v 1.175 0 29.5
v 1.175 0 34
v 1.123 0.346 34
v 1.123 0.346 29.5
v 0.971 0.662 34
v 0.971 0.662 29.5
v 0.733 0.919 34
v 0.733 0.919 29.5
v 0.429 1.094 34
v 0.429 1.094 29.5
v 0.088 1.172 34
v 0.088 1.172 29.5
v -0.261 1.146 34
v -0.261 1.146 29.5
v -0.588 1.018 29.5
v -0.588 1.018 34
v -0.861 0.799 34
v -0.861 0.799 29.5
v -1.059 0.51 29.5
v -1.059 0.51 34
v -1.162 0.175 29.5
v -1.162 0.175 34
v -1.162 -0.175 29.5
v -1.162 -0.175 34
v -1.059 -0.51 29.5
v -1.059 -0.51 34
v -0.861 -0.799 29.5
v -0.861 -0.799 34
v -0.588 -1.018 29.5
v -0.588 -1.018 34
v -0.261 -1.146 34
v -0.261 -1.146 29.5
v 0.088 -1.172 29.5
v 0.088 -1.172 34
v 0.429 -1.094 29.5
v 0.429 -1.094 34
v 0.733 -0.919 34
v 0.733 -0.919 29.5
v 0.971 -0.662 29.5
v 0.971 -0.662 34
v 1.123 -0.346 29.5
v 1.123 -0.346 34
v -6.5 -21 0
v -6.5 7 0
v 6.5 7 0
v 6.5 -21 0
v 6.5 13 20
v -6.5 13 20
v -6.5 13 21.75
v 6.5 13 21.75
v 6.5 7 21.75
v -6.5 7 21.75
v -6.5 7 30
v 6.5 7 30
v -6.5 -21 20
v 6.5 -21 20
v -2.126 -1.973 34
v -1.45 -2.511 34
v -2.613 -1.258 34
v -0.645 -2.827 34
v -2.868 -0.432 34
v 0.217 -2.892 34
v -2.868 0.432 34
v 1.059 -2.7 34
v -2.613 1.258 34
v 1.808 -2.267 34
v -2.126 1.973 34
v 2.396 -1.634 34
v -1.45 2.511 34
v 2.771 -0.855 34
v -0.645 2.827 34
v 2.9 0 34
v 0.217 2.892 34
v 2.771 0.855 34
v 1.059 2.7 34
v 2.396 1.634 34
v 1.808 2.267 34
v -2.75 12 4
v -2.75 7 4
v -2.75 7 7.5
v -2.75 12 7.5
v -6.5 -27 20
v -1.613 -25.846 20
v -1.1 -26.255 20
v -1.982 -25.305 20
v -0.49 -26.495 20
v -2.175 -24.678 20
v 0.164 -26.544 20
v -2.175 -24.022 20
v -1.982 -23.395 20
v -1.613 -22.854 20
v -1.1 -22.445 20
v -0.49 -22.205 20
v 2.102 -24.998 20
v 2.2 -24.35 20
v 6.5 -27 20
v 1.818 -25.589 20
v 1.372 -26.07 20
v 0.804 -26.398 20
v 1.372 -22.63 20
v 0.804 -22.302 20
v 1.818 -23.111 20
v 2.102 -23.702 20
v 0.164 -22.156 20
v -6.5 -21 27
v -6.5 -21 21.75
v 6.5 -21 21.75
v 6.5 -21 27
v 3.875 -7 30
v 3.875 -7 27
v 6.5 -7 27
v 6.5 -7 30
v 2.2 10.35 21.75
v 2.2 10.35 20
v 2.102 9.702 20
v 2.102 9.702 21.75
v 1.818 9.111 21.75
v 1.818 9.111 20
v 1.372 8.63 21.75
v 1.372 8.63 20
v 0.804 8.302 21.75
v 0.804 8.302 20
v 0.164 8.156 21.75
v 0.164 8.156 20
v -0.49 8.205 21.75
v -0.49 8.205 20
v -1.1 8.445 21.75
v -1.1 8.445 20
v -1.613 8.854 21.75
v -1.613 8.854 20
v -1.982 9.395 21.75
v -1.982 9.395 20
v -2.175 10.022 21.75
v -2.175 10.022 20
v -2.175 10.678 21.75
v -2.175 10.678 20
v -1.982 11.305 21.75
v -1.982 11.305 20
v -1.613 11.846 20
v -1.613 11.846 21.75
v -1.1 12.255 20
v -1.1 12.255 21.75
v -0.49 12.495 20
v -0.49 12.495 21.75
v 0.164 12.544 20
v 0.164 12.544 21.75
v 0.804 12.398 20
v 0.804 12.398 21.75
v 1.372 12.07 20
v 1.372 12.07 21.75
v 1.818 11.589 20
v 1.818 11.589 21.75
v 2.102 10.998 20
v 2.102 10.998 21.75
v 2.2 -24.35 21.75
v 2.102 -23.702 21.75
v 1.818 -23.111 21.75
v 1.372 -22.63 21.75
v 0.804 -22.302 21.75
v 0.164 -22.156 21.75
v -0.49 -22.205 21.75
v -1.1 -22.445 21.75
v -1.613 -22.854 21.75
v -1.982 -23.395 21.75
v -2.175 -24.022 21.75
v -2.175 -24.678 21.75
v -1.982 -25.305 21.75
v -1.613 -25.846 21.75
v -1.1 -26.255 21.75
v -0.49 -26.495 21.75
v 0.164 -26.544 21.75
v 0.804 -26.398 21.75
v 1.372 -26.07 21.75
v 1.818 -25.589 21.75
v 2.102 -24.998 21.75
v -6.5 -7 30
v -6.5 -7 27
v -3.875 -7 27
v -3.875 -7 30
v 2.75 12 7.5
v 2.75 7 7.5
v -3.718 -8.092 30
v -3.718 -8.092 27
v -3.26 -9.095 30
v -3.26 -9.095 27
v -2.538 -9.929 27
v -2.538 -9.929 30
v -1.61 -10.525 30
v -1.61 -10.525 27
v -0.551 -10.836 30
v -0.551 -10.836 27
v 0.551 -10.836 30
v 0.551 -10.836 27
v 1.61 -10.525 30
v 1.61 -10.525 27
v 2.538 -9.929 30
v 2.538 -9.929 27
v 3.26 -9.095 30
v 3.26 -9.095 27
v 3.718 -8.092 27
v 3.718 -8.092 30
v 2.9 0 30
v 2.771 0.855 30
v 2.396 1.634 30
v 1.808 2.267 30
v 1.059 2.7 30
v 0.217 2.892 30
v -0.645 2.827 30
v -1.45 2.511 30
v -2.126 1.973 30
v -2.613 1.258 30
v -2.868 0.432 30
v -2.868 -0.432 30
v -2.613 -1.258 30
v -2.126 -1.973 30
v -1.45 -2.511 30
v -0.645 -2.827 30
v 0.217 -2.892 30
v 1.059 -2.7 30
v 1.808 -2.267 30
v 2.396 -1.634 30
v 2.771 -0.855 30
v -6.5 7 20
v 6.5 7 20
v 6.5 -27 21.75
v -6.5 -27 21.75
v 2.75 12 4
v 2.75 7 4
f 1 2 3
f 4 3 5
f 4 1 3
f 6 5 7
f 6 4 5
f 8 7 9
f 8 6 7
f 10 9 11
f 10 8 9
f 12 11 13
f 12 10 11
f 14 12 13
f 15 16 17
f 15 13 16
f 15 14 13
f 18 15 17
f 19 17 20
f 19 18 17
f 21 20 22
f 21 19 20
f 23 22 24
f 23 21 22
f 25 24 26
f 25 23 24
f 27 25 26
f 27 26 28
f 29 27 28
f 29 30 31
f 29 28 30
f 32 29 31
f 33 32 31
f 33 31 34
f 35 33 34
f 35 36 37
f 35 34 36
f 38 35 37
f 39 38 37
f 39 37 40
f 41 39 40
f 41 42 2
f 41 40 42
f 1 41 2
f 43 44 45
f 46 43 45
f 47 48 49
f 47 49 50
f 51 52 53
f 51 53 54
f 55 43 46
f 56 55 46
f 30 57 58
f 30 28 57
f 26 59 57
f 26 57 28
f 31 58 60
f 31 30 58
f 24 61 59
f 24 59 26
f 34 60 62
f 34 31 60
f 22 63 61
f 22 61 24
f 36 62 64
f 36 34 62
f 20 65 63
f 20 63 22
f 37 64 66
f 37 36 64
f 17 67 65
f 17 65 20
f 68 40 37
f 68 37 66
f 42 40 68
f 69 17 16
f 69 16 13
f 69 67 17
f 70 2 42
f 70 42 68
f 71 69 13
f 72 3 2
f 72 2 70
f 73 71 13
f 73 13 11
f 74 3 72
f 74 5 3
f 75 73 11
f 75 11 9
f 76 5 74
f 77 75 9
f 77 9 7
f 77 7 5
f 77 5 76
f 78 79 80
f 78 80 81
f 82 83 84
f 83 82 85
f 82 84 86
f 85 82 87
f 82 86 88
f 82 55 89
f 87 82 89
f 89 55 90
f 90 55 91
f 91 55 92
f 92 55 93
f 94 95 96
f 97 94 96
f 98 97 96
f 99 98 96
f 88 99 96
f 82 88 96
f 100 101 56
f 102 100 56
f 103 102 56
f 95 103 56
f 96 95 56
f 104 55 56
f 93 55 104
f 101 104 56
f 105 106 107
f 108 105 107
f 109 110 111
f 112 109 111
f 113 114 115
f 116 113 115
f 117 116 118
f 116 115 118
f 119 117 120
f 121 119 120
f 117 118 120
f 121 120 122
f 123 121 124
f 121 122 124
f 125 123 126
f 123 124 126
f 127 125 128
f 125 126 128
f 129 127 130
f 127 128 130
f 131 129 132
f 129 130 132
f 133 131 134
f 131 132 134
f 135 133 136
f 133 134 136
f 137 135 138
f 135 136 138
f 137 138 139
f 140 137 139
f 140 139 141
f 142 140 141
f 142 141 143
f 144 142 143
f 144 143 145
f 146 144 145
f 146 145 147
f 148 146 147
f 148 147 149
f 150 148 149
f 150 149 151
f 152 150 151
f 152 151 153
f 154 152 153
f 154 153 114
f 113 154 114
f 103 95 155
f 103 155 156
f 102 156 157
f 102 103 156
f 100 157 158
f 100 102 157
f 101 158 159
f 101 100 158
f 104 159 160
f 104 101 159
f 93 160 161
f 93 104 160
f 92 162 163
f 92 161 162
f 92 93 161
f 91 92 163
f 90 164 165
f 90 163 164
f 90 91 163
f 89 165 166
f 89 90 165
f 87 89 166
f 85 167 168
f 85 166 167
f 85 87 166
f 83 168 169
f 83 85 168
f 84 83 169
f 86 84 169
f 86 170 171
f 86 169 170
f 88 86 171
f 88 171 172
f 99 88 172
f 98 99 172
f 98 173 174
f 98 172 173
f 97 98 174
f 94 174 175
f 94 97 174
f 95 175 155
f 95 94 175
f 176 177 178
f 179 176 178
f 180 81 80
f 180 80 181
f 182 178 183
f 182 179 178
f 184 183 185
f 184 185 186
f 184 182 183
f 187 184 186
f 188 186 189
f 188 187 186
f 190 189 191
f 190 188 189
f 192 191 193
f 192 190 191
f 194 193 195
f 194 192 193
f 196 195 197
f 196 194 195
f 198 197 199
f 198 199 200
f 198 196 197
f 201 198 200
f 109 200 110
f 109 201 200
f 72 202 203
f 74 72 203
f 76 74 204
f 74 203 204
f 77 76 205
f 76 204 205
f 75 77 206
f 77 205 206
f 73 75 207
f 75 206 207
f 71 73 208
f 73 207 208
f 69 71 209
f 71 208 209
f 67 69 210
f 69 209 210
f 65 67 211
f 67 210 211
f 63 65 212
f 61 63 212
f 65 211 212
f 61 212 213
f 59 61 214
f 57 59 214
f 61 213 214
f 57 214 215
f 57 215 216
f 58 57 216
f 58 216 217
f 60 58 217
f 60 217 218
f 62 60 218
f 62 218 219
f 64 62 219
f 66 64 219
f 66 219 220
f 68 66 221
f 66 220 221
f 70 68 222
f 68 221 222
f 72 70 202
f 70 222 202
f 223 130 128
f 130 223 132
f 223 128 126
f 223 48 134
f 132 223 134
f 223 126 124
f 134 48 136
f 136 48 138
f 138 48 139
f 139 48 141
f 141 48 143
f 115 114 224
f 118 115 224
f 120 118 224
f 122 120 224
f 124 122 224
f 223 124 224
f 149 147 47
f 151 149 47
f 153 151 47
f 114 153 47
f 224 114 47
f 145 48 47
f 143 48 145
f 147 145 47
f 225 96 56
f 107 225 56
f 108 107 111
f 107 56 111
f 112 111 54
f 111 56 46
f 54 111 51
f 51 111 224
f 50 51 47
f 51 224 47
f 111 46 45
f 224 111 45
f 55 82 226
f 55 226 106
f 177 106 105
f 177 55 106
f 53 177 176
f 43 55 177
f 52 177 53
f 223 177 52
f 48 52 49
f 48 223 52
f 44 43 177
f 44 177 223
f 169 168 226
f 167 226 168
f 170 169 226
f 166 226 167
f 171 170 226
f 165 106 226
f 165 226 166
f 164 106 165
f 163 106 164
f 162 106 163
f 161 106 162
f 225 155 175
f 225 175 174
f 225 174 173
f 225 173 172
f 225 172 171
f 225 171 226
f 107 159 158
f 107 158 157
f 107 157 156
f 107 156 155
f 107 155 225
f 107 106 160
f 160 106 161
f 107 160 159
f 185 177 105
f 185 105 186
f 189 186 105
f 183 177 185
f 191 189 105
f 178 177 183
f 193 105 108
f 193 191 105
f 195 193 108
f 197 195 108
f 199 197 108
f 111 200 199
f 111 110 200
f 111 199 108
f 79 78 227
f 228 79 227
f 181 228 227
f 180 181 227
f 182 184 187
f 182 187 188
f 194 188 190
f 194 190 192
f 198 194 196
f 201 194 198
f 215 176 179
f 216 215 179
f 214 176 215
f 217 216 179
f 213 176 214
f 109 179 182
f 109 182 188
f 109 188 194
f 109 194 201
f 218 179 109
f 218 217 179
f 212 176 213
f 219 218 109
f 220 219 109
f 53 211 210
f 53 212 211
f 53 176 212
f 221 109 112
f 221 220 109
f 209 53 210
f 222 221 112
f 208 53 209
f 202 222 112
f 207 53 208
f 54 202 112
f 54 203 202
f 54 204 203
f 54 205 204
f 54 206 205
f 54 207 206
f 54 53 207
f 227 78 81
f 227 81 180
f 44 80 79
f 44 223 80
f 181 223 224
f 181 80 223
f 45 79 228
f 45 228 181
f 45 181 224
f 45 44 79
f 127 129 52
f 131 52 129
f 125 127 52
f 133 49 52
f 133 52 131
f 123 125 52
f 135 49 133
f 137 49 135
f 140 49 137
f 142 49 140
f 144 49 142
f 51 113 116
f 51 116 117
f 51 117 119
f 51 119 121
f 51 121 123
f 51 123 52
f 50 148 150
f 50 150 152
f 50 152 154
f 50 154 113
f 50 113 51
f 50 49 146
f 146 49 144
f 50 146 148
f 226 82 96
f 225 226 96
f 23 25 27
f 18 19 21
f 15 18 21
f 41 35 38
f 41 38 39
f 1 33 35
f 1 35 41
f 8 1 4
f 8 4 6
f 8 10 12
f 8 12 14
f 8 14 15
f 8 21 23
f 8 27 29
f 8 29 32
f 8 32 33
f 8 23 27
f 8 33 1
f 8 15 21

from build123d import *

# Parameters (mm, degrees)
CYLINDER001_R     = 2.2
CYLINDER001_DEPTH = 5
CYLINDER002_R     = 1.175
CYLINDER002_DEPTH = 5
BOX004_W          = 5.5
BOX004_H          = 5
BOX004_DEPTH      = 3.5
CYLINDER_R        = 2.9
CYLINDER_DEPTH    = 4
BOX003_W          = 13
BOX003_H          = 14
BOX003_DEPTH      = 7
BOX002_W          = 13
BOX002_H          = 14
BOX002_DEPTH      = 10
BOX001_W          = 13
BOX001_H          = 40
BOX001_DEPTH      = 1.75
BOX_W             = 13
BOX_H             = 28
BOX_DEPTH         = 20
CYLINDER003_W     = 3.875
CYLINDER003_H     = 3
CYLINDER003_ANGLE = 180


with BuildPart() as taladro_master:
    # Cylinder001 → Cylinder001 (new body)
    with BuildSketch(Plane(origin=(0, -17.35, 18), x_dir=(1, 0, 0), z_dir=(0, 0, 1))):
        Circle(CYLINDER001_R)
    extrude(amount=CYLINDER001_DEPTH)


with BuildPart() as hueco_central_eje_de_arrastre:
    # Cylinder002 → Cylinder002 (new body)
    with BuildSketch(Plane(origin=(0, 7, 29.5), x_dir=(1, 0, 0), z_dir=(0, 0, 1))):
        Circle(CYLINDER002_R)
    extrude(amount=CYLINDER002_DEPTH)


with BuildPart() as fusion_huecos:
    # Part__Mirroring: instance of Taladro master
    add(taladro_master.part.mirror(Plane(origin=(0, 0, 0), x_dir=(1, 0, 0), z_dir=(0, 1, 0))))

    # Fusion001: union Taladro master, Hueco central eje de arrastre
    add(taladro_master.part)
    add(hueco_central_eje_de_arrastre.part)


with BuildPart() as salida_de_cableado:
    # Box004 → Box004 (new body)
    with BuildSketch(Plane(origin=(3.75, 28, 4), x_dir=(1, 0, 0), z_dir=(0, 0, 1))):
        with Locations((2.75, 2.5)):
            Rectangle(BOX004_W, BOX004_H)
    extrude(amount=BOX004_DEPTH)


with BuildPart() as cilindro:
    # Cylinder → Cylinder (new body)
    with BuildSketch(Plane(origin=(6.5, 21, 30), x_dir=(1, 0, 0), z_dir=(0, 0, 1))):
        Circle(CYLINDER_R)
    extrude(amount=CYLINDER_DEPTH)


with BuildPart() as resalte_superior:
    # Box003 → Box003 (new body)
    with BuildSketch(Plane.XY.offset(20)):
        with Locations((6.5, 7)):
            Rectangle(BOX003_W, BOX003_H)
    extrude(amount=BOX003_DEPTH)


with BuildPart() as cubo_eje:
    # Box002 → Box002 (new body)
    with BuildSketch(Plane(origin=(0, 14, 20), x_dir=(1, 0, 0), z_dir=(0, 0, 1))):
        with Locations((6.5, 7)):
            Rectangle(BOX002_W, BOX002_H)
    extrude(amount=BOX002_DEPTH)


with BuildPart() as aleta:
    # Box001 → Box001 (new body)
    with BuildSketch(Plane(origin=(0, -6, 20), x_dir=(1, 0, 0), z_dir=(0, 0, 1))):
        with Locations((6.5, 20)):
            Rectangle(BOX001_W, BOX001_H)
    extrude(amount=BOX001_DEPTH)


with BuildPart() as cuerpo_ppal_servo:
    # Box → Box (new body)
    with BuildSketch(Plane.XY):
        with Locations((6.5, 14)):
            Rectangle(BOX_W, BOX_H)
    extrude(amount=BOX_DEPTH)


with BuildPart() as servo_hd1160a_master:
    # Cylinder003 → Cylinder003 (revolve)
    with BuildSketch(Plane(origin=(6.5, 14, 27), x_dir=(-1, 0, 0), z_dir=(0, 1, 0))):
        with Locations((1.9375, 1.5)):
            Rectangle(CYLINDER003_W, CYLINDER003_H)
    revolve(axis=Axis((6.5, 14, 27), (0, 0, 1)), revolution_arc=CYLINDER003_ANGLE)

    # Fusion: union Salida de cableado, Cilindro, resalte superior, Cubo eje, Aleta, Cuerpo ppal servo
    add(salida_de_cableado.part)
    add(cilindro.part)
    add(resalte_superior.part)
    add(cubo_eje.part)
    add(aleta.part)
    add(cuerpo_ppal_servo.part)


with BuildPart() as servo_hd1160a_master_1:
    # Fusion placement: moved
    add(servo_hd1160a_master.part.moved(Location((-6.5, -14, 0))))

    # Cut: cut Fusion huecos
    add(fusion_huecos.part, mode=Mode.SUBTRACT)


with BuildPart() as servo_hd1160a_master_2:
    # Cut placement: moved
    add(servo_hd1160a_master_1.part.moved(Location((0, -7, 0))))


solid = servo_hd1160a_master_2.part
